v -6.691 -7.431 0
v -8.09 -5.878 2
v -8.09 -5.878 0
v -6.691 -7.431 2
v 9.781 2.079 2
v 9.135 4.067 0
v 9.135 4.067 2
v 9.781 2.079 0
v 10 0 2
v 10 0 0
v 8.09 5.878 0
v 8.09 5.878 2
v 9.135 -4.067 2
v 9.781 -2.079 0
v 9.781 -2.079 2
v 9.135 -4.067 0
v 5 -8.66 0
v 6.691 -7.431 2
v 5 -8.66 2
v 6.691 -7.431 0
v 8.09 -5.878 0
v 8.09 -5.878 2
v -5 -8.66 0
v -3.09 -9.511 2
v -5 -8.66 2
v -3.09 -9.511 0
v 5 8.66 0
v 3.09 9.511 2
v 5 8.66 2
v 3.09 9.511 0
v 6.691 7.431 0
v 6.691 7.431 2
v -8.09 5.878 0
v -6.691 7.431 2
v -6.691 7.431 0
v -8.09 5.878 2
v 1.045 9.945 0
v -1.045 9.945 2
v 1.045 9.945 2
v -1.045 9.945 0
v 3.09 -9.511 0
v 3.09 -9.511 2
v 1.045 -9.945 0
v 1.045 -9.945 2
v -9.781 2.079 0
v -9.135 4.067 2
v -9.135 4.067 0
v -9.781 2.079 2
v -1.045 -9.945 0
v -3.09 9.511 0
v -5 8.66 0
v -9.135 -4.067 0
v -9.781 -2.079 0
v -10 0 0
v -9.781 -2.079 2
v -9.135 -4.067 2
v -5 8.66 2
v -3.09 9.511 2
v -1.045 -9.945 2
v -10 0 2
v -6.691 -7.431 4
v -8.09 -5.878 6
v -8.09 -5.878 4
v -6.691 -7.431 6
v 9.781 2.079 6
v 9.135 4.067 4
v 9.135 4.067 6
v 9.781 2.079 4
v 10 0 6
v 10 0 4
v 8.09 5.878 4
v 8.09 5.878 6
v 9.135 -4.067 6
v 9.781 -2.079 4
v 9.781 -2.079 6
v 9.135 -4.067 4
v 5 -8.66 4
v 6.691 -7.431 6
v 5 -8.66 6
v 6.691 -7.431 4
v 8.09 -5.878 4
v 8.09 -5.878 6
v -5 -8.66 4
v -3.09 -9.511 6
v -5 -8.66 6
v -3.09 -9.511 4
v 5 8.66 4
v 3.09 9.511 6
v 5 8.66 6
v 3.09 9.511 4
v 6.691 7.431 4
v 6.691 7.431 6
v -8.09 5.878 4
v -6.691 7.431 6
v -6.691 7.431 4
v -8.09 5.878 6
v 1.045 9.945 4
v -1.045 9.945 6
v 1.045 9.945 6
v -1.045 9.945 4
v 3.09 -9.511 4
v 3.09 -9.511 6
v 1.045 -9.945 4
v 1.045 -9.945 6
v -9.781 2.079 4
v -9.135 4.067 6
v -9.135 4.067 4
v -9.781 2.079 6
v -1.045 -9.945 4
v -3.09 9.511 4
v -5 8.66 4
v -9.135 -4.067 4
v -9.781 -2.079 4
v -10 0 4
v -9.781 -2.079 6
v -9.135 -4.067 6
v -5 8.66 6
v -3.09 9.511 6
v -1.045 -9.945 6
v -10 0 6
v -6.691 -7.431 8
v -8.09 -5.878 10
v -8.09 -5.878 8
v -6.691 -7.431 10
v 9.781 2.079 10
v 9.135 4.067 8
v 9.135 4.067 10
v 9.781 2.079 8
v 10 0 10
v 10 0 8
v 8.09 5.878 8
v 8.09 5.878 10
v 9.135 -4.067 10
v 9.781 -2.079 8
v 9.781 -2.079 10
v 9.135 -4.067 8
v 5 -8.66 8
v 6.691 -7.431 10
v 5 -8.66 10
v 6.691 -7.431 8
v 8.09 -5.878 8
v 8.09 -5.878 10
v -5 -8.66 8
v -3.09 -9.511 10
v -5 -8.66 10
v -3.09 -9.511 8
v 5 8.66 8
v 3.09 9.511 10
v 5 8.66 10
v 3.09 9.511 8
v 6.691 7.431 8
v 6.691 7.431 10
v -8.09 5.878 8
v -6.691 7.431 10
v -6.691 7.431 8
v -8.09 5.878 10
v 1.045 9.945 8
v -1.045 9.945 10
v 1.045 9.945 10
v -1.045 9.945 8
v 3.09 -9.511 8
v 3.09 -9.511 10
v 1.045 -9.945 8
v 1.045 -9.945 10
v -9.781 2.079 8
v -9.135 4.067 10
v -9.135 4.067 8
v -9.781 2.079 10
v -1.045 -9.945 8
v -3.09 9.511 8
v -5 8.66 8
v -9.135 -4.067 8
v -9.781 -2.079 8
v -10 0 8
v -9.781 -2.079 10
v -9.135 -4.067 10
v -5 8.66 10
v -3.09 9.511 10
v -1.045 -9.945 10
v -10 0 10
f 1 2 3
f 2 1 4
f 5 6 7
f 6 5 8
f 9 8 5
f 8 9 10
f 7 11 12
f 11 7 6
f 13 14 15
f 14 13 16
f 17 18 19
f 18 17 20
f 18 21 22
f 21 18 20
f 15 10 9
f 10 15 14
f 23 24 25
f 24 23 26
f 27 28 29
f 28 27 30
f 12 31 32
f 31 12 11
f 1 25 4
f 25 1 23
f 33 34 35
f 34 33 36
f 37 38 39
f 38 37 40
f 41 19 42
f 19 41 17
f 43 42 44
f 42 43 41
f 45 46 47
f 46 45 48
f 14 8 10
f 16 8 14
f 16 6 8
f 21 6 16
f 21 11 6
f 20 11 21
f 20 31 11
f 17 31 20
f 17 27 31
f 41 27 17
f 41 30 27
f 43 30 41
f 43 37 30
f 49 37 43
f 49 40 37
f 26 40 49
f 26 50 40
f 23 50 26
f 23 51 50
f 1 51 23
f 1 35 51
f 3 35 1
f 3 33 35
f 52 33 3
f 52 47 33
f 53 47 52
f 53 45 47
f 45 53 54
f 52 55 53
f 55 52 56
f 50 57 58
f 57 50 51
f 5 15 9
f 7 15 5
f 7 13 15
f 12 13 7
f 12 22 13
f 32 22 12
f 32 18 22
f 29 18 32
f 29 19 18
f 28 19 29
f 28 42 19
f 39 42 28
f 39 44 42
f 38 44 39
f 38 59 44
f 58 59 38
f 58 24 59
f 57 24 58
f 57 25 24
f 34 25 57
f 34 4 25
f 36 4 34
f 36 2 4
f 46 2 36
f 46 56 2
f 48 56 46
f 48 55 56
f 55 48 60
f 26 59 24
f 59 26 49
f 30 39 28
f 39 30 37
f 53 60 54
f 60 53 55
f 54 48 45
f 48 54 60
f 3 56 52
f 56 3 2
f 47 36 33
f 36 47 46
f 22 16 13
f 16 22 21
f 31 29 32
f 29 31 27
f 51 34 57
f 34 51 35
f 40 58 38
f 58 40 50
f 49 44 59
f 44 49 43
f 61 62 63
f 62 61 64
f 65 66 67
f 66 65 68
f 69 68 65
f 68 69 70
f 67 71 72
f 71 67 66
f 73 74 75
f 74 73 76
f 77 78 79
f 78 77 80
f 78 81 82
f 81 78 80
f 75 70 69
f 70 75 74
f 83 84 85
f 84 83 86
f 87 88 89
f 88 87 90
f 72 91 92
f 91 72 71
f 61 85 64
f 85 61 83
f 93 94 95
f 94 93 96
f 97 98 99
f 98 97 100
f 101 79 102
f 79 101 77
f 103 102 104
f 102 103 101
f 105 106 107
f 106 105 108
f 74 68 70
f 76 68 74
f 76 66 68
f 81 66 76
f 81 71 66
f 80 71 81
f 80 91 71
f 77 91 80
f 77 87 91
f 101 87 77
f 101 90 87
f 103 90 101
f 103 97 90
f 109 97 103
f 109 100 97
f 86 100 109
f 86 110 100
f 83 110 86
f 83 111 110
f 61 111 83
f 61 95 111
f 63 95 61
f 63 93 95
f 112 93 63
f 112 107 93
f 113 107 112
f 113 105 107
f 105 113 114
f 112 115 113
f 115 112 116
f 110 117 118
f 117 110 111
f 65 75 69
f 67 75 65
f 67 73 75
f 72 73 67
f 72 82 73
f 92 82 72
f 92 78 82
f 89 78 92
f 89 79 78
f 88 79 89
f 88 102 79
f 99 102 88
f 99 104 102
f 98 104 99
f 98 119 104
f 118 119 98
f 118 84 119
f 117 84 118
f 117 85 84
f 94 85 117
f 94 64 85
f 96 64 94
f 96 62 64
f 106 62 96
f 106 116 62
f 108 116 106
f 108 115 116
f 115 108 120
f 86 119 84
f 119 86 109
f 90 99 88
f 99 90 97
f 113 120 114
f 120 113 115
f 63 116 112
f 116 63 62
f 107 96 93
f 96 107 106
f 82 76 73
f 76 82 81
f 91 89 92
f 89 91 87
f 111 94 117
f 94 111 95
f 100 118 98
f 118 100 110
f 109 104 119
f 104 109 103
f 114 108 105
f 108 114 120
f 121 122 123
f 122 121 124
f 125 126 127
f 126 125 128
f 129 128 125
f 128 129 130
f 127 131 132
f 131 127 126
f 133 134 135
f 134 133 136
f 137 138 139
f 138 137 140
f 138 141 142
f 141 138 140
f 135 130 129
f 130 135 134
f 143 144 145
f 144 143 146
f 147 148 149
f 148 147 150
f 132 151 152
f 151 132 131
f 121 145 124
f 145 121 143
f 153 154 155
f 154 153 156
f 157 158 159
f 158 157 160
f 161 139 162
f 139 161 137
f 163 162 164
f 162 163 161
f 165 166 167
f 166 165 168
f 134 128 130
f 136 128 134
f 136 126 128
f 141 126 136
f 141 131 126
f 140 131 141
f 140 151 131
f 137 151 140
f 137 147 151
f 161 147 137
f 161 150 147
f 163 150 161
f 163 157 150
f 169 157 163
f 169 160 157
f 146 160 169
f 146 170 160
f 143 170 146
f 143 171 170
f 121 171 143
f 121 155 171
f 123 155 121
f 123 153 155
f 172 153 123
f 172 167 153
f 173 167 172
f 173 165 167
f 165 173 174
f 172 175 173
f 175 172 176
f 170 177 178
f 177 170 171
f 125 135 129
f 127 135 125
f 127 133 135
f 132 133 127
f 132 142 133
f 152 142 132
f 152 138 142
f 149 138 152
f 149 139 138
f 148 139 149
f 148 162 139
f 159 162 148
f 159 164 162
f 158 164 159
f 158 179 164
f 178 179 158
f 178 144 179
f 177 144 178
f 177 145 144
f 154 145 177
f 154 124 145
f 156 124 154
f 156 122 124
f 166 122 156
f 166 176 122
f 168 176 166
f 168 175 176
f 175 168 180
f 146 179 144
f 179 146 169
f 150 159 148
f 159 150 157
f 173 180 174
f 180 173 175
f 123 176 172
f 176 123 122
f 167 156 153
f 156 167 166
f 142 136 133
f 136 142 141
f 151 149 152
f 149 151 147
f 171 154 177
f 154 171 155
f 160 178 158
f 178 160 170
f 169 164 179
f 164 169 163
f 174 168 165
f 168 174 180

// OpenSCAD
layers = 5;
layer_height = 2;

extruder = 0; //0 or 1.

for(layer = [0:2:layers - 1 - extruder]) {
	translate([0, 0, (layer + extruder) * layer_height]) {
		cylinder(r=10, h=layer_height);
	}
}
